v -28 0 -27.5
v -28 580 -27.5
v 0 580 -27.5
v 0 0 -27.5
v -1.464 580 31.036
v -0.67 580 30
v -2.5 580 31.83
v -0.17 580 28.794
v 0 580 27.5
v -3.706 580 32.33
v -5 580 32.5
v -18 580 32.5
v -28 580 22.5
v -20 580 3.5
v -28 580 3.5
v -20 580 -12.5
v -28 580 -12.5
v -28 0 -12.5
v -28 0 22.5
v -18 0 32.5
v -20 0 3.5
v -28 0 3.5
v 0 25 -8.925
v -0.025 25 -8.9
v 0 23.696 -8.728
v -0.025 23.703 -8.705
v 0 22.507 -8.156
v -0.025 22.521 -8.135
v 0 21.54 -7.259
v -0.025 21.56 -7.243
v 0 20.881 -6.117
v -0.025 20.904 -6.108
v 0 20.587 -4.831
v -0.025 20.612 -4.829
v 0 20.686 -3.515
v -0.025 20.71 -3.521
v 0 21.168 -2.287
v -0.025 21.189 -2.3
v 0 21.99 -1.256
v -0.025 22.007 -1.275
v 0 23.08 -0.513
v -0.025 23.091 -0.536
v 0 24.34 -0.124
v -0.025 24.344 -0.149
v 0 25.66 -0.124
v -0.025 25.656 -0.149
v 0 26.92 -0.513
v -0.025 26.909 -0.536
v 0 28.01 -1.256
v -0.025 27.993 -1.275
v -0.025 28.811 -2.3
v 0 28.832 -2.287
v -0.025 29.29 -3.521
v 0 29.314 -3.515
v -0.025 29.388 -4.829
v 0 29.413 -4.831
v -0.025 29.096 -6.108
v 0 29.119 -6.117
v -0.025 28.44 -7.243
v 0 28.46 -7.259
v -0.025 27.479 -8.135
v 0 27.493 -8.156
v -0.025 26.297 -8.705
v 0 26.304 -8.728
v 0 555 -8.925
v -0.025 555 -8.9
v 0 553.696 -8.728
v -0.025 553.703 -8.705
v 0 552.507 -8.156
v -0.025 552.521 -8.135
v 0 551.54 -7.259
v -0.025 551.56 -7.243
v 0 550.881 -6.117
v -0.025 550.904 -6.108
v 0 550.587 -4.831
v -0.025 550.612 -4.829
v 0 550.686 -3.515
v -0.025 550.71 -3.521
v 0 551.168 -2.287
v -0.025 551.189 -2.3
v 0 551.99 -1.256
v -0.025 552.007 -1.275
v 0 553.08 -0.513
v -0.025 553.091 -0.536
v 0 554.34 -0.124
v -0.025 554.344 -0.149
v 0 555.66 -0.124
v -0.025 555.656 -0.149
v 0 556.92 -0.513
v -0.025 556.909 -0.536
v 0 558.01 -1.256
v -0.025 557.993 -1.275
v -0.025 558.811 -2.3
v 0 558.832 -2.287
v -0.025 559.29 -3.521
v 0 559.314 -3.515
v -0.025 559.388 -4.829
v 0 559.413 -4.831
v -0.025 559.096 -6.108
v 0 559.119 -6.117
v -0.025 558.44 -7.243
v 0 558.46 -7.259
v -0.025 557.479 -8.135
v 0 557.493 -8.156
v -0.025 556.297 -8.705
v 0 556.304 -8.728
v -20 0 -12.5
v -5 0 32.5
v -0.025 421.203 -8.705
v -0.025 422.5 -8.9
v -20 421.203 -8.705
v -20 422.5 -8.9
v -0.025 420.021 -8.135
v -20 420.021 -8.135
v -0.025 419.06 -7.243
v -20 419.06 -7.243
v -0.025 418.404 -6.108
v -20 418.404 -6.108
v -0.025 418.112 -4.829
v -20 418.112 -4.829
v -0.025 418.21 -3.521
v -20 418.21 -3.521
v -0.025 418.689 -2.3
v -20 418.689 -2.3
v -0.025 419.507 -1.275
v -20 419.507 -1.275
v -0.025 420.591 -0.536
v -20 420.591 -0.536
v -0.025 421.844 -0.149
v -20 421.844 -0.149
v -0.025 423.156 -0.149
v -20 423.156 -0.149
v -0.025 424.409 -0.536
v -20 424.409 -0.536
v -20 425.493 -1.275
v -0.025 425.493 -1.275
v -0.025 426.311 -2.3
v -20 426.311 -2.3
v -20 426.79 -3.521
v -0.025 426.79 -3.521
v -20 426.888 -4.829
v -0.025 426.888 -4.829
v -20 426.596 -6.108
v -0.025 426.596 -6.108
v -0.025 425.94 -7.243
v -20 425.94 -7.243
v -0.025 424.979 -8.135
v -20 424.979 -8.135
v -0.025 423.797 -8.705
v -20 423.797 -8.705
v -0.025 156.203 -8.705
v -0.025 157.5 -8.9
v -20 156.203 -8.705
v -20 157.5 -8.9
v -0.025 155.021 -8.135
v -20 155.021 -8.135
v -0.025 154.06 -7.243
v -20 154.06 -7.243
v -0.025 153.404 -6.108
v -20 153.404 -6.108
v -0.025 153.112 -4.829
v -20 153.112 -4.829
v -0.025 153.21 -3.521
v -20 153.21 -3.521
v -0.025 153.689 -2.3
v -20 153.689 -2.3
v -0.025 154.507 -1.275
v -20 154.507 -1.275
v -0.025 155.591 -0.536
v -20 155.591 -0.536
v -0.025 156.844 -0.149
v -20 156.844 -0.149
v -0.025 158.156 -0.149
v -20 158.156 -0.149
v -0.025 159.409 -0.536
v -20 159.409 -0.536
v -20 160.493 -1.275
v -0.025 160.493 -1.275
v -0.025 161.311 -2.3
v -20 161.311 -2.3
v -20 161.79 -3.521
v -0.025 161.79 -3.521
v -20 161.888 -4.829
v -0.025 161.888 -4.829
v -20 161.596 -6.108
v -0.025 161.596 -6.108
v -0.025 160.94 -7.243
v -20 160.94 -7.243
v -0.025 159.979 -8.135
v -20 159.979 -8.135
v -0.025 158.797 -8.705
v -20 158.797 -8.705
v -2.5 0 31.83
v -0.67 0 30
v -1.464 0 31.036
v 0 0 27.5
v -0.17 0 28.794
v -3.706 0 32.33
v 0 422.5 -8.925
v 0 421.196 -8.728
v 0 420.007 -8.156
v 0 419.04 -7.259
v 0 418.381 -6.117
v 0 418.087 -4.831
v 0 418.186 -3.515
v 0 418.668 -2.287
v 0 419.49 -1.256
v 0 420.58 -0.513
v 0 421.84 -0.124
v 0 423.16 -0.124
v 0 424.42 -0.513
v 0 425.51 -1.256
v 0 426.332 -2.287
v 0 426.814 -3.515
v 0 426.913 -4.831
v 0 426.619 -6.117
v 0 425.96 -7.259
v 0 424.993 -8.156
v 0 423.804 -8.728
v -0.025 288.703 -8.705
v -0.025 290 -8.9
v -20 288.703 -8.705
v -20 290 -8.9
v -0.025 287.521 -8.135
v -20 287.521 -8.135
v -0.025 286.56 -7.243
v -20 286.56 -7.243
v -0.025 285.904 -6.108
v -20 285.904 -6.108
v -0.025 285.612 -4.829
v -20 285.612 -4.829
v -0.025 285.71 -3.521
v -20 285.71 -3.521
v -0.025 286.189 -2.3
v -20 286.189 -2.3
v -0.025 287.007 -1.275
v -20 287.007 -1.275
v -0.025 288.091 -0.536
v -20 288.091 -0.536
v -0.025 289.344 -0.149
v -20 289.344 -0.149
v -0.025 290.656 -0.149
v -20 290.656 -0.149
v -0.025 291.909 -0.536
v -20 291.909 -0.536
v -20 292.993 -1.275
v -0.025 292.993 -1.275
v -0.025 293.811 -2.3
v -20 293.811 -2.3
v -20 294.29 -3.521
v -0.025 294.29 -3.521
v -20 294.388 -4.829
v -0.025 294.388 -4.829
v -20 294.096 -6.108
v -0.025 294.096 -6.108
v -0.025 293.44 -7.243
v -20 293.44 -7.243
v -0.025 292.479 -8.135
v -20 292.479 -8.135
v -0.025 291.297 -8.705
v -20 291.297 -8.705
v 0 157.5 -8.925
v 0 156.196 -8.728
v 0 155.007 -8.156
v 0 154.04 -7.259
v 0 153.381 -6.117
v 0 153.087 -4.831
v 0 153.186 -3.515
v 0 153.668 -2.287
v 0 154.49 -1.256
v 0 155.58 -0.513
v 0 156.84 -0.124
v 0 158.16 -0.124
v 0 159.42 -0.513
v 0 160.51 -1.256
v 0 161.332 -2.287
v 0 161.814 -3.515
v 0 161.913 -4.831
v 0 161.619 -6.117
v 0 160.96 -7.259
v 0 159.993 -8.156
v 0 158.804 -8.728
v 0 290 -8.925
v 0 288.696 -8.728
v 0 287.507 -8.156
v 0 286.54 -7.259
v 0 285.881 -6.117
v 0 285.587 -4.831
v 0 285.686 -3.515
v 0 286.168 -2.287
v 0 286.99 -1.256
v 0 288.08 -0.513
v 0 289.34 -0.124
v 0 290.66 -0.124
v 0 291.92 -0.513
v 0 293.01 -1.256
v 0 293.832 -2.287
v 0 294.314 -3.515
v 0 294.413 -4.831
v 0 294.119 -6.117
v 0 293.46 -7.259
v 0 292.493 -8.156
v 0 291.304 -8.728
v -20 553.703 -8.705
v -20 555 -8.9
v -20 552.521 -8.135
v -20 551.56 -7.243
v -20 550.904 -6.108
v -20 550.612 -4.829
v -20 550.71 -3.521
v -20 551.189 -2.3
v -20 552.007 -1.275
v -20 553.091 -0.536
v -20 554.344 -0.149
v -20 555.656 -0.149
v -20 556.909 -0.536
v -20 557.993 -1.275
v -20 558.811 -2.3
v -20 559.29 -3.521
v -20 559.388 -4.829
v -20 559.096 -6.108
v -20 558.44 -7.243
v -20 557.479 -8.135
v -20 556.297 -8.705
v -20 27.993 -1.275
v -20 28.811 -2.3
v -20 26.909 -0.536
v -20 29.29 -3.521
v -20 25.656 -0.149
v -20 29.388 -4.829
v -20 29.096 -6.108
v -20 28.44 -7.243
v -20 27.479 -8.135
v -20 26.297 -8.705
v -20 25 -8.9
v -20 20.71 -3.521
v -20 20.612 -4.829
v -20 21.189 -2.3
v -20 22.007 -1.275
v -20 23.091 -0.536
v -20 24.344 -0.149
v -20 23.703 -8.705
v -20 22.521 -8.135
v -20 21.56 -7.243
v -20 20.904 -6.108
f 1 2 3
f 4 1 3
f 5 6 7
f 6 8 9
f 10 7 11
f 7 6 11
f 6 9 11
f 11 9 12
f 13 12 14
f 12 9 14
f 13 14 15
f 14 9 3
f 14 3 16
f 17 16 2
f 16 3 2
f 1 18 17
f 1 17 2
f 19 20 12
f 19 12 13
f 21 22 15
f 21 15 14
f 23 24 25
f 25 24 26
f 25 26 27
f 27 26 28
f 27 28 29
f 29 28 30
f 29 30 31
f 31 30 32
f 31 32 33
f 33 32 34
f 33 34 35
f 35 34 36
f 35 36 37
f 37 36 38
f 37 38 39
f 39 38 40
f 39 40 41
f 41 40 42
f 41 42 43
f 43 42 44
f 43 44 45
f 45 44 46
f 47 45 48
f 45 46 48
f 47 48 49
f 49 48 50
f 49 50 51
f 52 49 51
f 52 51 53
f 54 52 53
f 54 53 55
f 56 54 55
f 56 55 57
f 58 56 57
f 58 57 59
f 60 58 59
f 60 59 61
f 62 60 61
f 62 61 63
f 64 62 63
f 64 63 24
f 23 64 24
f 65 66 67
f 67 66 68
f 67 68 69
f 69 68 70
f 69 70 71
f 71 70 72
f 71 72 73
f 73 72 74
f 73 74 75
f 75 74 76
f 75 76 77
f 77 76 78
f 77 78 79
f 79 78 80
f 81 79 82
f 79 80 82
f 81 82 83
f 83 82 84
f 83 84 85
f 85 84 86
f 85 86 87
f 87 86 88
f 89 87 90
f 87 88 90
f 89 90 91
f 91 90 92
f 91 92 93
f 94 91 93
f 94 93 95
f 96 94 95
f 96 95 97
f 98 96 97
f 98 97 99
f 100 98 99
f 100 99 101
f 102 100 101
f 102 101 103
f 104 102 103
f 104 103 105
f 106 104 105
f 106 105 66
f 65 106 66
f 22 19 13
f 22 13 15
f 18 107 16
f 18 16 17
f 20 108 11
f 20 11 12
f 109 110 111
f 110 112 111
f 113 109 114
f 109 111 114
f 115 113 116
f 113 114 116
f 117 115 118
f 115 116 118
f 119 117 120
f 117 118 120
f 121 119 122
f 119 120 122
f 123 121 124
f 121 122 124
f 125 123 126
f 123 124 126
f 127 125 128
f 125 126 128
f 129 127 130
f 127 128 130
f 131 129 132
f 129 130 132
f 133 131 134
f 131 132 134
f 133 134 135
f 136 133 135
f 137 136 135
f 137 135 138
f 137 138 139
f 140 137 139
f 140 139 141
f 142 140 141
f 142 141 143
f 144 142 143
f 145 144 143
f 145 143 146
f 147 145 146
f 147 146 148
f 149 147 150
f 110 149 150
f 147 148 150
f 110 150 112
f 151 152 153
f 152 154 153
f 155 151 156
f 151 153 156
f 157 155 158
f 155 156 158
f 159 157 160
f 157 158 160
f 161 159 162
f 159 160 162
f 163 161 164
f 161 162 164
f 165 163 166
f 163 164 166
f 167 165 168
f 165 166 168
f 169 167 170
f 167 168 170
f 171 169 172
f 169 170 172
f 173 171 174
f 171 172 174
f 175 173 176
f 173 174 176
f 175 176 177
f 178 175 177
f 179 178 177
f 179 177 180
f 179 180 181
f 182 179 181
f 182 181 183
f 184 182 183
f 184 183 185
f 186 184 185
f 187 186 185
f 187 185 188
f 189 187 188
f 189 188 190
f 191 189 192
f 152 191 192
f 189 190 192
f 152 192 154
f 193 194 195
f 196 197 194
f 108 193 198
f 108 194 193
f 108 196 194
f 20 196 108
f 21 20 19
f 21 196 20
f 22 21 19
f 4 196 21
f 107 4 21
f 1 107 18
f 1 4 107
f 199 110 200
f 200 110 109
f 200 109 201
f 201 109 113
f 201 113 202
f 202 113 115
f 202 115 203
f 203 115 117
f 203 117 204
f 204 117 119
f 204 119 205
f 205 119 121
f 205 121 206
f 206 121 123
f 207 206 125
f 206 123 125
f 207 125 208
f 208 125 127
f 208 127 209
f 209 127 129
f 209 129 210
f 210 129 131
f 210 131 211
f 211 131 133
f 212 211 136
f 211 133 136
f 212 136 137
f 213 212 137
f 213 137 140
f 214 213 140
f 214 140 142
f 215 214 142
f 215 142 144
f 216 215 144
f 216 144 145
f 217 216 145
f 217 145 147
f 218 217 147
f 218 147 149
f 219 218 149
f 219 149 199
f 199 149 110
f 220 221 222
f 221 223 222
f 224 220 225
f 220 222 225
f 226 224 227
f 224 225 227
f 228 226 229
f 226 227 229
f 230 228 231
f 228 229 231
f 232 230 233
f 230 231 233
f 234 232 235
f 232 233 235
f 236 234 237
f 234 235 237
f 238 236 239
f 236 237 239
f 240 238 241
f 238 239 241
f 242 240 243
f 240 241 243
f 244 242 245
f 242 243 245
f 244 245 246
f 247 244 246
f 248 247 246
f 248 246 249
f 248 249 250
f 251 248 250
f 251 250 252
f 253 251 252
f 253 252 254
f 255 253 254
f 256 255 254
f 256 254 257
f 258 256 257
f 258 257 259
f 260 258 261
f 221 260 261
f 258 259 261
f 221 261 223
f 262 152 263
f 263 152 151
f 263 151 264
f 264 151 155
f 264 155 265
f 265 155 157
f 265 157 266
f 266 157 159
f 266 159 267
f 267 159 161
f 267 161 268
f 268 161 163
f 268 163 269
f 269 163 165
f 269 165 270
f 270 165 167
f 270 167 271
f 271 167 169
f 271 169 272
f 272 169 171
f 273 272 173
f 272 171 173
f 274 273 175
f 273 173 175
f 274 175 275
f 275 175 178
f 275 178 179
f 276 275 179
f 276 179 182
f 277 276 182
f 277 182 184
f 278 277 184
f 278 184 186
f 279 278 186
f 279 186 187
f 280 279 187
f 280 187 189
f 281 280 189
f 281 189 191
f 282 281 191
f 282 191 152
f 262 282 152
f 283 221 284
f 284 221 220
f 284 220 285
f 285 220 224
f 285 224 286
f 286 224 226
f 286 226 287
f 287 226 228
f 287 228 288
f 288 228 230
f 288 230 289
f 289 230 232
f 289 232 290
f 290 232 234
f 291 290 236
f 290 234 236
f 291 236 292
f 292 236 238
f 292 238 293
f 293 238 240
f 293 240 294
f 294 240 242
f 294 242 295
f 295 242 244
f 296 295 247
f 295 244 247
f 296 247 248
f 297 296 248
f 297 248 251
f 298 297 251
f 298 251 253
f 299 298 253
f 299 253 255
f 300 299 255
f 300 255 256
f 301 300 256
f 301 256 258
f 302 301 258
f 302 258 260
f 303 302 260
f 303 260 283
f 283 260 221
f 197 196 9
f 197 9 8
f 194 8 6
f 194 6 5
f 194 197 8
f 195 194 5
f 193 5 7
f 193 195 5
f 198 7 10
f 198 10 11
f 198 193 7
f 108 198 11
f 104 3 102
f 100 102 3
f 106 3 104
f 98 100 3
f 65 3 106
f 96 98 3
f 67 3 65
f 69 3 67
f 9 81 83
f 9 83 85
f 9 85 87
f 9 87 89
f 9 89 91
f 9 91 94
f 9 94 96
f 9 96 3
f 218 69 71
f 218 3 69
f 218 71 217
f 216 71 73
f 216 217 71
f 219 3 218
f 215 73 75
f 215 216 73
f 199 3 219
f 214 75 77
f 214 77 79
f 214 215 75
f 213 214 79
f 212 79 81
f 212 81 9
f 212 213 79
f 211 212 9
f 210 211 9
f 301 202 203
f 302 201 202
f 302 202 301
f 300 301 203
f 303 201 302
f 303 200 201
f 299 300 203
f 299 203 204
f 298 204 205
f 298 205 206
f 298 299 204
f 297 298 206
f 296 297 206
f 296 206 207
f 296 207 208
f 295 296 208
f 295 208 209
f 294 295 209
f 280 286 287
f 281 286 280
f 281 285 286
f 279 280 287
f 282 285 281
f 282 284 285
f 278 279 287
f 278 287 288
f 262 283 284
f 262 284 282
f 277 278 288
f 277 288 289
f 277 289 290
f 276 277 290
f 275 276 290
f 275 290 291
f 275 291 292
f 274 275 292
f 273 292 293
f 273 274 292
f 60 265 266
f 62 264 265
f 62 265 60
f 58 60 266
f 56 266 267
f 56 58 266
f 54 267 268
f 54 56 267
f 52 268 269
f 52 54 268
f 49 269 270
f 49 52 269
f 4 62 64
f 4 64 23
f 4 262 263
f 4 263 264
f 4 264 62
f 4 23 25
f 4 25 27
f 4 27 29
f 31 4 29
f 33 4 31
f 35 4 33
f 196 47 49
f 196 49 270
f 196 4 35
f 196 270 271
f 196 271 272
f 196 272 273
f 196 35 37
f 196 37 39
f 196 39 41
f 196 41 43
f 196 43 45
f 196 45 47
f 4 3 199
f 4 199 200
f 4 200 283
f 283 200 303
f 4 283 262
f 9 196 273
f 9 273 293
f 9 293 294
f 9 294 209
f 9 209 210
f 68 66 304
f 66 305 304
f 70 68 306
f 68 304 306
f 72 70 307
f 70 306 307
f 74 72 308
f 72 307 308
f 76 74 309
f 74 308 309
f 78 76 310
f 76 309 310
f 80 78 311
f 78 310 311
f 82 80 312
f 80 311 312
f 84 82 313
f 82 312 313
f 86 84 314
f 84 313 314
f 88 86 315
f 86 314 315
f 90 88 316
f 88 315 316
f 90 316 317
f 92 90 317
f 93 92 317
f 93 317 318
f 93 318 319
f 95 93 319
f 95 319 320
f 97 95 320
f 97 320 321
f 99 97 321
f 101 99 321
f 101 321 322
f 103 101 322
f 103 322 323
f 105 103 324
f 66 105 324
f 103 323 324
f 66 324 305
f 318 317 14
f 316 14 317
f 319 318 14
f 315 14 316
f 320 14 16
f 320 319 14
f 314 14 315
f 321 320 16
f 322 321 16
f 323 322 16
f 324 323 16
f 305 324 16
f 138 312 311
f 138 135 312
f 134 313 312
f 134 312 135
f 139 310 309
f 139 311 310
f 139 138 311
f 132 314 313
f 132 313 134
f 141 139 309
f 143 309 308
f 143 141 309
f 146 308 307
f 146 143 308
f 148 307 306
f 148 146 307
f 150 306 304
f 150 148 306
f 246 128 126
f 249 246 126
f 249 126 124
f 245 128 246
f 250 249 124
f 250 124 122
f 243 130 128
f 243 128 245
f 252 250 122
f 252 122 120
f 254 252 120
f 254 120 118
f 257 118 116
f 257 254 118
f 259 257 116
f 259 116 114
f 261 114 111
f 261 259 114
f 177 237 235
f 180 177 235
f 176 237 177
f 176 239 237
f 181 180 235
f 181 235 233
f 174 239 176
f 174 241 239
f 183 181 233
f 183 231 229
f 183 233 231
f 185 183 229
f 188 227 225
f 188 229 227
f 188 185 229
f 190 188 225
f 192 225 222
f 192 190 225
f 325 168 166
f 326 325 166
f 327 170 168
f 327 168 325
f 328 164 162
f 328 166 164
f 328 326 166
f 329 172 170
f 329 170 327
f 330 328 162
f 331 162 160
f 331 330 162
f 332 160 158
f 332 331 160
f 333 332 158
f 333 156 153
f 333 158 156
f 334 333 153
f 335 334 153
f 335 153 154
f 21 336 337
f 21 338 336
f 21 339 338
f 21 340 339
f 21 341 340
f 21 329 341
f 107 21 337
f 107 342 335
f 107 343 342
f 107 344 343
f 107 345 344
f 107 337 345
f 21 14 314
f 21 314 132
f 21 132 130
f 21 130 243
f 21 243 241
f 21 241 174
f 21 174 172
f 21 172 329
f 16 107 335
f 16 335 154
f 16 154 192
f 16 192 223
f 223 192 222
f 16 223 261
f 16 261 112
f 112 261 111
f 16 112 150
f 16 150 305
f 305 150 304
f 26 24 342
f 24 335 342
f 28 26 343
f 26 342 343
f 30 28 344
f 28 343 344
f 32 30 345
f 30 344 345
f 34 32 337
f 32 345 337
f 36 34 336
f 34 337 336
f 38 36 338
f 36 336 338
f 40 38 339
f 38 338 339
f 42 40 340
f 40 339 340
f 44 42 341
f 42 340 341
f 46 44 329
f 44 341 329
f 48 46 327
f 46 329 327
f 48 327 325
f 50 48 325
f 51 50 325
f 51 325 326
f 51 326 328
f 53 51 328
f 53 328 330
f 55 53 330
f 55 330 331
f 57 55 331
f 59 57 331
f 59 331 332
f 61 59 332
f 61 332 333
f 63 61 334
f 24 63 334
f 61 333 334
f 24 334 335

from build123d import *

# Parameters (mm, degrees)
BOSS_EXTRUDE1_DEPTH                     = 580
TAP_DRILL_FOR_M10X1_25_TAP1_D           = 8.8
TAP_DRILL_FOR_M10X1_25_TAP1_CSINK_D     = 8.85
TAP_DRILL_FOR_M10X1_25_TAP1_CSINK_ANGLE = 90


with BuildPart() as part:
    # Sketch1 → Boss-Extrude1 (new body)
    with BuildSketch(Plane(origin=(0, 0, 0), x_dir=(1, 0, 0), z_dir=(0, 1, 0))):
        with BuildLine():
            Line((-28, 27.5), (0, 27.5))
            Line((0, 27.5), (0, -27.5))
            ThreePointArc((0, -27.5), (-1.464466094, -31.035533906), (-5, -32.5))
            Line((-5, -32.5), (-18, -32.5))
            Line((-18, -32.5), (-28, -22.5))
            Line((-28, -22.5), (-28, -3.5))
            Line((-28, -3.5), (-20, -3.5))
            Line((-20, -3.5), (-20, 12.5))
            Line((-20, 12.5), (-28, 12.5))
            Line((-28, 12.5), (-28, 27.5))
        make_face()
    extrude(amount=BOSS_EXTRUDE1_DEPTH)

    # Tap Drill for M10x1.25 Tap1 (through all)
    with Locations(Plane(origin=(0, 25, -4.5), x_dir=(0, 0, 1), z_dir=(1, 0, 0))):
        with Locations((0, 0), (0, -132.5), (0, -265), (0, -397.5), (0, -530)):
            CounterSinkHole(TAP_DRILL_FOR_M10X1_25_TAP1_D / 2, TAP_DRILL_FOR_M10X1_25_TAP1_CSINK_D / 2, counter_sink_angle=TAP_DRILL_FOR_M10X1_25_TAP1_CSINK_ANGLE)


solid = part.part
